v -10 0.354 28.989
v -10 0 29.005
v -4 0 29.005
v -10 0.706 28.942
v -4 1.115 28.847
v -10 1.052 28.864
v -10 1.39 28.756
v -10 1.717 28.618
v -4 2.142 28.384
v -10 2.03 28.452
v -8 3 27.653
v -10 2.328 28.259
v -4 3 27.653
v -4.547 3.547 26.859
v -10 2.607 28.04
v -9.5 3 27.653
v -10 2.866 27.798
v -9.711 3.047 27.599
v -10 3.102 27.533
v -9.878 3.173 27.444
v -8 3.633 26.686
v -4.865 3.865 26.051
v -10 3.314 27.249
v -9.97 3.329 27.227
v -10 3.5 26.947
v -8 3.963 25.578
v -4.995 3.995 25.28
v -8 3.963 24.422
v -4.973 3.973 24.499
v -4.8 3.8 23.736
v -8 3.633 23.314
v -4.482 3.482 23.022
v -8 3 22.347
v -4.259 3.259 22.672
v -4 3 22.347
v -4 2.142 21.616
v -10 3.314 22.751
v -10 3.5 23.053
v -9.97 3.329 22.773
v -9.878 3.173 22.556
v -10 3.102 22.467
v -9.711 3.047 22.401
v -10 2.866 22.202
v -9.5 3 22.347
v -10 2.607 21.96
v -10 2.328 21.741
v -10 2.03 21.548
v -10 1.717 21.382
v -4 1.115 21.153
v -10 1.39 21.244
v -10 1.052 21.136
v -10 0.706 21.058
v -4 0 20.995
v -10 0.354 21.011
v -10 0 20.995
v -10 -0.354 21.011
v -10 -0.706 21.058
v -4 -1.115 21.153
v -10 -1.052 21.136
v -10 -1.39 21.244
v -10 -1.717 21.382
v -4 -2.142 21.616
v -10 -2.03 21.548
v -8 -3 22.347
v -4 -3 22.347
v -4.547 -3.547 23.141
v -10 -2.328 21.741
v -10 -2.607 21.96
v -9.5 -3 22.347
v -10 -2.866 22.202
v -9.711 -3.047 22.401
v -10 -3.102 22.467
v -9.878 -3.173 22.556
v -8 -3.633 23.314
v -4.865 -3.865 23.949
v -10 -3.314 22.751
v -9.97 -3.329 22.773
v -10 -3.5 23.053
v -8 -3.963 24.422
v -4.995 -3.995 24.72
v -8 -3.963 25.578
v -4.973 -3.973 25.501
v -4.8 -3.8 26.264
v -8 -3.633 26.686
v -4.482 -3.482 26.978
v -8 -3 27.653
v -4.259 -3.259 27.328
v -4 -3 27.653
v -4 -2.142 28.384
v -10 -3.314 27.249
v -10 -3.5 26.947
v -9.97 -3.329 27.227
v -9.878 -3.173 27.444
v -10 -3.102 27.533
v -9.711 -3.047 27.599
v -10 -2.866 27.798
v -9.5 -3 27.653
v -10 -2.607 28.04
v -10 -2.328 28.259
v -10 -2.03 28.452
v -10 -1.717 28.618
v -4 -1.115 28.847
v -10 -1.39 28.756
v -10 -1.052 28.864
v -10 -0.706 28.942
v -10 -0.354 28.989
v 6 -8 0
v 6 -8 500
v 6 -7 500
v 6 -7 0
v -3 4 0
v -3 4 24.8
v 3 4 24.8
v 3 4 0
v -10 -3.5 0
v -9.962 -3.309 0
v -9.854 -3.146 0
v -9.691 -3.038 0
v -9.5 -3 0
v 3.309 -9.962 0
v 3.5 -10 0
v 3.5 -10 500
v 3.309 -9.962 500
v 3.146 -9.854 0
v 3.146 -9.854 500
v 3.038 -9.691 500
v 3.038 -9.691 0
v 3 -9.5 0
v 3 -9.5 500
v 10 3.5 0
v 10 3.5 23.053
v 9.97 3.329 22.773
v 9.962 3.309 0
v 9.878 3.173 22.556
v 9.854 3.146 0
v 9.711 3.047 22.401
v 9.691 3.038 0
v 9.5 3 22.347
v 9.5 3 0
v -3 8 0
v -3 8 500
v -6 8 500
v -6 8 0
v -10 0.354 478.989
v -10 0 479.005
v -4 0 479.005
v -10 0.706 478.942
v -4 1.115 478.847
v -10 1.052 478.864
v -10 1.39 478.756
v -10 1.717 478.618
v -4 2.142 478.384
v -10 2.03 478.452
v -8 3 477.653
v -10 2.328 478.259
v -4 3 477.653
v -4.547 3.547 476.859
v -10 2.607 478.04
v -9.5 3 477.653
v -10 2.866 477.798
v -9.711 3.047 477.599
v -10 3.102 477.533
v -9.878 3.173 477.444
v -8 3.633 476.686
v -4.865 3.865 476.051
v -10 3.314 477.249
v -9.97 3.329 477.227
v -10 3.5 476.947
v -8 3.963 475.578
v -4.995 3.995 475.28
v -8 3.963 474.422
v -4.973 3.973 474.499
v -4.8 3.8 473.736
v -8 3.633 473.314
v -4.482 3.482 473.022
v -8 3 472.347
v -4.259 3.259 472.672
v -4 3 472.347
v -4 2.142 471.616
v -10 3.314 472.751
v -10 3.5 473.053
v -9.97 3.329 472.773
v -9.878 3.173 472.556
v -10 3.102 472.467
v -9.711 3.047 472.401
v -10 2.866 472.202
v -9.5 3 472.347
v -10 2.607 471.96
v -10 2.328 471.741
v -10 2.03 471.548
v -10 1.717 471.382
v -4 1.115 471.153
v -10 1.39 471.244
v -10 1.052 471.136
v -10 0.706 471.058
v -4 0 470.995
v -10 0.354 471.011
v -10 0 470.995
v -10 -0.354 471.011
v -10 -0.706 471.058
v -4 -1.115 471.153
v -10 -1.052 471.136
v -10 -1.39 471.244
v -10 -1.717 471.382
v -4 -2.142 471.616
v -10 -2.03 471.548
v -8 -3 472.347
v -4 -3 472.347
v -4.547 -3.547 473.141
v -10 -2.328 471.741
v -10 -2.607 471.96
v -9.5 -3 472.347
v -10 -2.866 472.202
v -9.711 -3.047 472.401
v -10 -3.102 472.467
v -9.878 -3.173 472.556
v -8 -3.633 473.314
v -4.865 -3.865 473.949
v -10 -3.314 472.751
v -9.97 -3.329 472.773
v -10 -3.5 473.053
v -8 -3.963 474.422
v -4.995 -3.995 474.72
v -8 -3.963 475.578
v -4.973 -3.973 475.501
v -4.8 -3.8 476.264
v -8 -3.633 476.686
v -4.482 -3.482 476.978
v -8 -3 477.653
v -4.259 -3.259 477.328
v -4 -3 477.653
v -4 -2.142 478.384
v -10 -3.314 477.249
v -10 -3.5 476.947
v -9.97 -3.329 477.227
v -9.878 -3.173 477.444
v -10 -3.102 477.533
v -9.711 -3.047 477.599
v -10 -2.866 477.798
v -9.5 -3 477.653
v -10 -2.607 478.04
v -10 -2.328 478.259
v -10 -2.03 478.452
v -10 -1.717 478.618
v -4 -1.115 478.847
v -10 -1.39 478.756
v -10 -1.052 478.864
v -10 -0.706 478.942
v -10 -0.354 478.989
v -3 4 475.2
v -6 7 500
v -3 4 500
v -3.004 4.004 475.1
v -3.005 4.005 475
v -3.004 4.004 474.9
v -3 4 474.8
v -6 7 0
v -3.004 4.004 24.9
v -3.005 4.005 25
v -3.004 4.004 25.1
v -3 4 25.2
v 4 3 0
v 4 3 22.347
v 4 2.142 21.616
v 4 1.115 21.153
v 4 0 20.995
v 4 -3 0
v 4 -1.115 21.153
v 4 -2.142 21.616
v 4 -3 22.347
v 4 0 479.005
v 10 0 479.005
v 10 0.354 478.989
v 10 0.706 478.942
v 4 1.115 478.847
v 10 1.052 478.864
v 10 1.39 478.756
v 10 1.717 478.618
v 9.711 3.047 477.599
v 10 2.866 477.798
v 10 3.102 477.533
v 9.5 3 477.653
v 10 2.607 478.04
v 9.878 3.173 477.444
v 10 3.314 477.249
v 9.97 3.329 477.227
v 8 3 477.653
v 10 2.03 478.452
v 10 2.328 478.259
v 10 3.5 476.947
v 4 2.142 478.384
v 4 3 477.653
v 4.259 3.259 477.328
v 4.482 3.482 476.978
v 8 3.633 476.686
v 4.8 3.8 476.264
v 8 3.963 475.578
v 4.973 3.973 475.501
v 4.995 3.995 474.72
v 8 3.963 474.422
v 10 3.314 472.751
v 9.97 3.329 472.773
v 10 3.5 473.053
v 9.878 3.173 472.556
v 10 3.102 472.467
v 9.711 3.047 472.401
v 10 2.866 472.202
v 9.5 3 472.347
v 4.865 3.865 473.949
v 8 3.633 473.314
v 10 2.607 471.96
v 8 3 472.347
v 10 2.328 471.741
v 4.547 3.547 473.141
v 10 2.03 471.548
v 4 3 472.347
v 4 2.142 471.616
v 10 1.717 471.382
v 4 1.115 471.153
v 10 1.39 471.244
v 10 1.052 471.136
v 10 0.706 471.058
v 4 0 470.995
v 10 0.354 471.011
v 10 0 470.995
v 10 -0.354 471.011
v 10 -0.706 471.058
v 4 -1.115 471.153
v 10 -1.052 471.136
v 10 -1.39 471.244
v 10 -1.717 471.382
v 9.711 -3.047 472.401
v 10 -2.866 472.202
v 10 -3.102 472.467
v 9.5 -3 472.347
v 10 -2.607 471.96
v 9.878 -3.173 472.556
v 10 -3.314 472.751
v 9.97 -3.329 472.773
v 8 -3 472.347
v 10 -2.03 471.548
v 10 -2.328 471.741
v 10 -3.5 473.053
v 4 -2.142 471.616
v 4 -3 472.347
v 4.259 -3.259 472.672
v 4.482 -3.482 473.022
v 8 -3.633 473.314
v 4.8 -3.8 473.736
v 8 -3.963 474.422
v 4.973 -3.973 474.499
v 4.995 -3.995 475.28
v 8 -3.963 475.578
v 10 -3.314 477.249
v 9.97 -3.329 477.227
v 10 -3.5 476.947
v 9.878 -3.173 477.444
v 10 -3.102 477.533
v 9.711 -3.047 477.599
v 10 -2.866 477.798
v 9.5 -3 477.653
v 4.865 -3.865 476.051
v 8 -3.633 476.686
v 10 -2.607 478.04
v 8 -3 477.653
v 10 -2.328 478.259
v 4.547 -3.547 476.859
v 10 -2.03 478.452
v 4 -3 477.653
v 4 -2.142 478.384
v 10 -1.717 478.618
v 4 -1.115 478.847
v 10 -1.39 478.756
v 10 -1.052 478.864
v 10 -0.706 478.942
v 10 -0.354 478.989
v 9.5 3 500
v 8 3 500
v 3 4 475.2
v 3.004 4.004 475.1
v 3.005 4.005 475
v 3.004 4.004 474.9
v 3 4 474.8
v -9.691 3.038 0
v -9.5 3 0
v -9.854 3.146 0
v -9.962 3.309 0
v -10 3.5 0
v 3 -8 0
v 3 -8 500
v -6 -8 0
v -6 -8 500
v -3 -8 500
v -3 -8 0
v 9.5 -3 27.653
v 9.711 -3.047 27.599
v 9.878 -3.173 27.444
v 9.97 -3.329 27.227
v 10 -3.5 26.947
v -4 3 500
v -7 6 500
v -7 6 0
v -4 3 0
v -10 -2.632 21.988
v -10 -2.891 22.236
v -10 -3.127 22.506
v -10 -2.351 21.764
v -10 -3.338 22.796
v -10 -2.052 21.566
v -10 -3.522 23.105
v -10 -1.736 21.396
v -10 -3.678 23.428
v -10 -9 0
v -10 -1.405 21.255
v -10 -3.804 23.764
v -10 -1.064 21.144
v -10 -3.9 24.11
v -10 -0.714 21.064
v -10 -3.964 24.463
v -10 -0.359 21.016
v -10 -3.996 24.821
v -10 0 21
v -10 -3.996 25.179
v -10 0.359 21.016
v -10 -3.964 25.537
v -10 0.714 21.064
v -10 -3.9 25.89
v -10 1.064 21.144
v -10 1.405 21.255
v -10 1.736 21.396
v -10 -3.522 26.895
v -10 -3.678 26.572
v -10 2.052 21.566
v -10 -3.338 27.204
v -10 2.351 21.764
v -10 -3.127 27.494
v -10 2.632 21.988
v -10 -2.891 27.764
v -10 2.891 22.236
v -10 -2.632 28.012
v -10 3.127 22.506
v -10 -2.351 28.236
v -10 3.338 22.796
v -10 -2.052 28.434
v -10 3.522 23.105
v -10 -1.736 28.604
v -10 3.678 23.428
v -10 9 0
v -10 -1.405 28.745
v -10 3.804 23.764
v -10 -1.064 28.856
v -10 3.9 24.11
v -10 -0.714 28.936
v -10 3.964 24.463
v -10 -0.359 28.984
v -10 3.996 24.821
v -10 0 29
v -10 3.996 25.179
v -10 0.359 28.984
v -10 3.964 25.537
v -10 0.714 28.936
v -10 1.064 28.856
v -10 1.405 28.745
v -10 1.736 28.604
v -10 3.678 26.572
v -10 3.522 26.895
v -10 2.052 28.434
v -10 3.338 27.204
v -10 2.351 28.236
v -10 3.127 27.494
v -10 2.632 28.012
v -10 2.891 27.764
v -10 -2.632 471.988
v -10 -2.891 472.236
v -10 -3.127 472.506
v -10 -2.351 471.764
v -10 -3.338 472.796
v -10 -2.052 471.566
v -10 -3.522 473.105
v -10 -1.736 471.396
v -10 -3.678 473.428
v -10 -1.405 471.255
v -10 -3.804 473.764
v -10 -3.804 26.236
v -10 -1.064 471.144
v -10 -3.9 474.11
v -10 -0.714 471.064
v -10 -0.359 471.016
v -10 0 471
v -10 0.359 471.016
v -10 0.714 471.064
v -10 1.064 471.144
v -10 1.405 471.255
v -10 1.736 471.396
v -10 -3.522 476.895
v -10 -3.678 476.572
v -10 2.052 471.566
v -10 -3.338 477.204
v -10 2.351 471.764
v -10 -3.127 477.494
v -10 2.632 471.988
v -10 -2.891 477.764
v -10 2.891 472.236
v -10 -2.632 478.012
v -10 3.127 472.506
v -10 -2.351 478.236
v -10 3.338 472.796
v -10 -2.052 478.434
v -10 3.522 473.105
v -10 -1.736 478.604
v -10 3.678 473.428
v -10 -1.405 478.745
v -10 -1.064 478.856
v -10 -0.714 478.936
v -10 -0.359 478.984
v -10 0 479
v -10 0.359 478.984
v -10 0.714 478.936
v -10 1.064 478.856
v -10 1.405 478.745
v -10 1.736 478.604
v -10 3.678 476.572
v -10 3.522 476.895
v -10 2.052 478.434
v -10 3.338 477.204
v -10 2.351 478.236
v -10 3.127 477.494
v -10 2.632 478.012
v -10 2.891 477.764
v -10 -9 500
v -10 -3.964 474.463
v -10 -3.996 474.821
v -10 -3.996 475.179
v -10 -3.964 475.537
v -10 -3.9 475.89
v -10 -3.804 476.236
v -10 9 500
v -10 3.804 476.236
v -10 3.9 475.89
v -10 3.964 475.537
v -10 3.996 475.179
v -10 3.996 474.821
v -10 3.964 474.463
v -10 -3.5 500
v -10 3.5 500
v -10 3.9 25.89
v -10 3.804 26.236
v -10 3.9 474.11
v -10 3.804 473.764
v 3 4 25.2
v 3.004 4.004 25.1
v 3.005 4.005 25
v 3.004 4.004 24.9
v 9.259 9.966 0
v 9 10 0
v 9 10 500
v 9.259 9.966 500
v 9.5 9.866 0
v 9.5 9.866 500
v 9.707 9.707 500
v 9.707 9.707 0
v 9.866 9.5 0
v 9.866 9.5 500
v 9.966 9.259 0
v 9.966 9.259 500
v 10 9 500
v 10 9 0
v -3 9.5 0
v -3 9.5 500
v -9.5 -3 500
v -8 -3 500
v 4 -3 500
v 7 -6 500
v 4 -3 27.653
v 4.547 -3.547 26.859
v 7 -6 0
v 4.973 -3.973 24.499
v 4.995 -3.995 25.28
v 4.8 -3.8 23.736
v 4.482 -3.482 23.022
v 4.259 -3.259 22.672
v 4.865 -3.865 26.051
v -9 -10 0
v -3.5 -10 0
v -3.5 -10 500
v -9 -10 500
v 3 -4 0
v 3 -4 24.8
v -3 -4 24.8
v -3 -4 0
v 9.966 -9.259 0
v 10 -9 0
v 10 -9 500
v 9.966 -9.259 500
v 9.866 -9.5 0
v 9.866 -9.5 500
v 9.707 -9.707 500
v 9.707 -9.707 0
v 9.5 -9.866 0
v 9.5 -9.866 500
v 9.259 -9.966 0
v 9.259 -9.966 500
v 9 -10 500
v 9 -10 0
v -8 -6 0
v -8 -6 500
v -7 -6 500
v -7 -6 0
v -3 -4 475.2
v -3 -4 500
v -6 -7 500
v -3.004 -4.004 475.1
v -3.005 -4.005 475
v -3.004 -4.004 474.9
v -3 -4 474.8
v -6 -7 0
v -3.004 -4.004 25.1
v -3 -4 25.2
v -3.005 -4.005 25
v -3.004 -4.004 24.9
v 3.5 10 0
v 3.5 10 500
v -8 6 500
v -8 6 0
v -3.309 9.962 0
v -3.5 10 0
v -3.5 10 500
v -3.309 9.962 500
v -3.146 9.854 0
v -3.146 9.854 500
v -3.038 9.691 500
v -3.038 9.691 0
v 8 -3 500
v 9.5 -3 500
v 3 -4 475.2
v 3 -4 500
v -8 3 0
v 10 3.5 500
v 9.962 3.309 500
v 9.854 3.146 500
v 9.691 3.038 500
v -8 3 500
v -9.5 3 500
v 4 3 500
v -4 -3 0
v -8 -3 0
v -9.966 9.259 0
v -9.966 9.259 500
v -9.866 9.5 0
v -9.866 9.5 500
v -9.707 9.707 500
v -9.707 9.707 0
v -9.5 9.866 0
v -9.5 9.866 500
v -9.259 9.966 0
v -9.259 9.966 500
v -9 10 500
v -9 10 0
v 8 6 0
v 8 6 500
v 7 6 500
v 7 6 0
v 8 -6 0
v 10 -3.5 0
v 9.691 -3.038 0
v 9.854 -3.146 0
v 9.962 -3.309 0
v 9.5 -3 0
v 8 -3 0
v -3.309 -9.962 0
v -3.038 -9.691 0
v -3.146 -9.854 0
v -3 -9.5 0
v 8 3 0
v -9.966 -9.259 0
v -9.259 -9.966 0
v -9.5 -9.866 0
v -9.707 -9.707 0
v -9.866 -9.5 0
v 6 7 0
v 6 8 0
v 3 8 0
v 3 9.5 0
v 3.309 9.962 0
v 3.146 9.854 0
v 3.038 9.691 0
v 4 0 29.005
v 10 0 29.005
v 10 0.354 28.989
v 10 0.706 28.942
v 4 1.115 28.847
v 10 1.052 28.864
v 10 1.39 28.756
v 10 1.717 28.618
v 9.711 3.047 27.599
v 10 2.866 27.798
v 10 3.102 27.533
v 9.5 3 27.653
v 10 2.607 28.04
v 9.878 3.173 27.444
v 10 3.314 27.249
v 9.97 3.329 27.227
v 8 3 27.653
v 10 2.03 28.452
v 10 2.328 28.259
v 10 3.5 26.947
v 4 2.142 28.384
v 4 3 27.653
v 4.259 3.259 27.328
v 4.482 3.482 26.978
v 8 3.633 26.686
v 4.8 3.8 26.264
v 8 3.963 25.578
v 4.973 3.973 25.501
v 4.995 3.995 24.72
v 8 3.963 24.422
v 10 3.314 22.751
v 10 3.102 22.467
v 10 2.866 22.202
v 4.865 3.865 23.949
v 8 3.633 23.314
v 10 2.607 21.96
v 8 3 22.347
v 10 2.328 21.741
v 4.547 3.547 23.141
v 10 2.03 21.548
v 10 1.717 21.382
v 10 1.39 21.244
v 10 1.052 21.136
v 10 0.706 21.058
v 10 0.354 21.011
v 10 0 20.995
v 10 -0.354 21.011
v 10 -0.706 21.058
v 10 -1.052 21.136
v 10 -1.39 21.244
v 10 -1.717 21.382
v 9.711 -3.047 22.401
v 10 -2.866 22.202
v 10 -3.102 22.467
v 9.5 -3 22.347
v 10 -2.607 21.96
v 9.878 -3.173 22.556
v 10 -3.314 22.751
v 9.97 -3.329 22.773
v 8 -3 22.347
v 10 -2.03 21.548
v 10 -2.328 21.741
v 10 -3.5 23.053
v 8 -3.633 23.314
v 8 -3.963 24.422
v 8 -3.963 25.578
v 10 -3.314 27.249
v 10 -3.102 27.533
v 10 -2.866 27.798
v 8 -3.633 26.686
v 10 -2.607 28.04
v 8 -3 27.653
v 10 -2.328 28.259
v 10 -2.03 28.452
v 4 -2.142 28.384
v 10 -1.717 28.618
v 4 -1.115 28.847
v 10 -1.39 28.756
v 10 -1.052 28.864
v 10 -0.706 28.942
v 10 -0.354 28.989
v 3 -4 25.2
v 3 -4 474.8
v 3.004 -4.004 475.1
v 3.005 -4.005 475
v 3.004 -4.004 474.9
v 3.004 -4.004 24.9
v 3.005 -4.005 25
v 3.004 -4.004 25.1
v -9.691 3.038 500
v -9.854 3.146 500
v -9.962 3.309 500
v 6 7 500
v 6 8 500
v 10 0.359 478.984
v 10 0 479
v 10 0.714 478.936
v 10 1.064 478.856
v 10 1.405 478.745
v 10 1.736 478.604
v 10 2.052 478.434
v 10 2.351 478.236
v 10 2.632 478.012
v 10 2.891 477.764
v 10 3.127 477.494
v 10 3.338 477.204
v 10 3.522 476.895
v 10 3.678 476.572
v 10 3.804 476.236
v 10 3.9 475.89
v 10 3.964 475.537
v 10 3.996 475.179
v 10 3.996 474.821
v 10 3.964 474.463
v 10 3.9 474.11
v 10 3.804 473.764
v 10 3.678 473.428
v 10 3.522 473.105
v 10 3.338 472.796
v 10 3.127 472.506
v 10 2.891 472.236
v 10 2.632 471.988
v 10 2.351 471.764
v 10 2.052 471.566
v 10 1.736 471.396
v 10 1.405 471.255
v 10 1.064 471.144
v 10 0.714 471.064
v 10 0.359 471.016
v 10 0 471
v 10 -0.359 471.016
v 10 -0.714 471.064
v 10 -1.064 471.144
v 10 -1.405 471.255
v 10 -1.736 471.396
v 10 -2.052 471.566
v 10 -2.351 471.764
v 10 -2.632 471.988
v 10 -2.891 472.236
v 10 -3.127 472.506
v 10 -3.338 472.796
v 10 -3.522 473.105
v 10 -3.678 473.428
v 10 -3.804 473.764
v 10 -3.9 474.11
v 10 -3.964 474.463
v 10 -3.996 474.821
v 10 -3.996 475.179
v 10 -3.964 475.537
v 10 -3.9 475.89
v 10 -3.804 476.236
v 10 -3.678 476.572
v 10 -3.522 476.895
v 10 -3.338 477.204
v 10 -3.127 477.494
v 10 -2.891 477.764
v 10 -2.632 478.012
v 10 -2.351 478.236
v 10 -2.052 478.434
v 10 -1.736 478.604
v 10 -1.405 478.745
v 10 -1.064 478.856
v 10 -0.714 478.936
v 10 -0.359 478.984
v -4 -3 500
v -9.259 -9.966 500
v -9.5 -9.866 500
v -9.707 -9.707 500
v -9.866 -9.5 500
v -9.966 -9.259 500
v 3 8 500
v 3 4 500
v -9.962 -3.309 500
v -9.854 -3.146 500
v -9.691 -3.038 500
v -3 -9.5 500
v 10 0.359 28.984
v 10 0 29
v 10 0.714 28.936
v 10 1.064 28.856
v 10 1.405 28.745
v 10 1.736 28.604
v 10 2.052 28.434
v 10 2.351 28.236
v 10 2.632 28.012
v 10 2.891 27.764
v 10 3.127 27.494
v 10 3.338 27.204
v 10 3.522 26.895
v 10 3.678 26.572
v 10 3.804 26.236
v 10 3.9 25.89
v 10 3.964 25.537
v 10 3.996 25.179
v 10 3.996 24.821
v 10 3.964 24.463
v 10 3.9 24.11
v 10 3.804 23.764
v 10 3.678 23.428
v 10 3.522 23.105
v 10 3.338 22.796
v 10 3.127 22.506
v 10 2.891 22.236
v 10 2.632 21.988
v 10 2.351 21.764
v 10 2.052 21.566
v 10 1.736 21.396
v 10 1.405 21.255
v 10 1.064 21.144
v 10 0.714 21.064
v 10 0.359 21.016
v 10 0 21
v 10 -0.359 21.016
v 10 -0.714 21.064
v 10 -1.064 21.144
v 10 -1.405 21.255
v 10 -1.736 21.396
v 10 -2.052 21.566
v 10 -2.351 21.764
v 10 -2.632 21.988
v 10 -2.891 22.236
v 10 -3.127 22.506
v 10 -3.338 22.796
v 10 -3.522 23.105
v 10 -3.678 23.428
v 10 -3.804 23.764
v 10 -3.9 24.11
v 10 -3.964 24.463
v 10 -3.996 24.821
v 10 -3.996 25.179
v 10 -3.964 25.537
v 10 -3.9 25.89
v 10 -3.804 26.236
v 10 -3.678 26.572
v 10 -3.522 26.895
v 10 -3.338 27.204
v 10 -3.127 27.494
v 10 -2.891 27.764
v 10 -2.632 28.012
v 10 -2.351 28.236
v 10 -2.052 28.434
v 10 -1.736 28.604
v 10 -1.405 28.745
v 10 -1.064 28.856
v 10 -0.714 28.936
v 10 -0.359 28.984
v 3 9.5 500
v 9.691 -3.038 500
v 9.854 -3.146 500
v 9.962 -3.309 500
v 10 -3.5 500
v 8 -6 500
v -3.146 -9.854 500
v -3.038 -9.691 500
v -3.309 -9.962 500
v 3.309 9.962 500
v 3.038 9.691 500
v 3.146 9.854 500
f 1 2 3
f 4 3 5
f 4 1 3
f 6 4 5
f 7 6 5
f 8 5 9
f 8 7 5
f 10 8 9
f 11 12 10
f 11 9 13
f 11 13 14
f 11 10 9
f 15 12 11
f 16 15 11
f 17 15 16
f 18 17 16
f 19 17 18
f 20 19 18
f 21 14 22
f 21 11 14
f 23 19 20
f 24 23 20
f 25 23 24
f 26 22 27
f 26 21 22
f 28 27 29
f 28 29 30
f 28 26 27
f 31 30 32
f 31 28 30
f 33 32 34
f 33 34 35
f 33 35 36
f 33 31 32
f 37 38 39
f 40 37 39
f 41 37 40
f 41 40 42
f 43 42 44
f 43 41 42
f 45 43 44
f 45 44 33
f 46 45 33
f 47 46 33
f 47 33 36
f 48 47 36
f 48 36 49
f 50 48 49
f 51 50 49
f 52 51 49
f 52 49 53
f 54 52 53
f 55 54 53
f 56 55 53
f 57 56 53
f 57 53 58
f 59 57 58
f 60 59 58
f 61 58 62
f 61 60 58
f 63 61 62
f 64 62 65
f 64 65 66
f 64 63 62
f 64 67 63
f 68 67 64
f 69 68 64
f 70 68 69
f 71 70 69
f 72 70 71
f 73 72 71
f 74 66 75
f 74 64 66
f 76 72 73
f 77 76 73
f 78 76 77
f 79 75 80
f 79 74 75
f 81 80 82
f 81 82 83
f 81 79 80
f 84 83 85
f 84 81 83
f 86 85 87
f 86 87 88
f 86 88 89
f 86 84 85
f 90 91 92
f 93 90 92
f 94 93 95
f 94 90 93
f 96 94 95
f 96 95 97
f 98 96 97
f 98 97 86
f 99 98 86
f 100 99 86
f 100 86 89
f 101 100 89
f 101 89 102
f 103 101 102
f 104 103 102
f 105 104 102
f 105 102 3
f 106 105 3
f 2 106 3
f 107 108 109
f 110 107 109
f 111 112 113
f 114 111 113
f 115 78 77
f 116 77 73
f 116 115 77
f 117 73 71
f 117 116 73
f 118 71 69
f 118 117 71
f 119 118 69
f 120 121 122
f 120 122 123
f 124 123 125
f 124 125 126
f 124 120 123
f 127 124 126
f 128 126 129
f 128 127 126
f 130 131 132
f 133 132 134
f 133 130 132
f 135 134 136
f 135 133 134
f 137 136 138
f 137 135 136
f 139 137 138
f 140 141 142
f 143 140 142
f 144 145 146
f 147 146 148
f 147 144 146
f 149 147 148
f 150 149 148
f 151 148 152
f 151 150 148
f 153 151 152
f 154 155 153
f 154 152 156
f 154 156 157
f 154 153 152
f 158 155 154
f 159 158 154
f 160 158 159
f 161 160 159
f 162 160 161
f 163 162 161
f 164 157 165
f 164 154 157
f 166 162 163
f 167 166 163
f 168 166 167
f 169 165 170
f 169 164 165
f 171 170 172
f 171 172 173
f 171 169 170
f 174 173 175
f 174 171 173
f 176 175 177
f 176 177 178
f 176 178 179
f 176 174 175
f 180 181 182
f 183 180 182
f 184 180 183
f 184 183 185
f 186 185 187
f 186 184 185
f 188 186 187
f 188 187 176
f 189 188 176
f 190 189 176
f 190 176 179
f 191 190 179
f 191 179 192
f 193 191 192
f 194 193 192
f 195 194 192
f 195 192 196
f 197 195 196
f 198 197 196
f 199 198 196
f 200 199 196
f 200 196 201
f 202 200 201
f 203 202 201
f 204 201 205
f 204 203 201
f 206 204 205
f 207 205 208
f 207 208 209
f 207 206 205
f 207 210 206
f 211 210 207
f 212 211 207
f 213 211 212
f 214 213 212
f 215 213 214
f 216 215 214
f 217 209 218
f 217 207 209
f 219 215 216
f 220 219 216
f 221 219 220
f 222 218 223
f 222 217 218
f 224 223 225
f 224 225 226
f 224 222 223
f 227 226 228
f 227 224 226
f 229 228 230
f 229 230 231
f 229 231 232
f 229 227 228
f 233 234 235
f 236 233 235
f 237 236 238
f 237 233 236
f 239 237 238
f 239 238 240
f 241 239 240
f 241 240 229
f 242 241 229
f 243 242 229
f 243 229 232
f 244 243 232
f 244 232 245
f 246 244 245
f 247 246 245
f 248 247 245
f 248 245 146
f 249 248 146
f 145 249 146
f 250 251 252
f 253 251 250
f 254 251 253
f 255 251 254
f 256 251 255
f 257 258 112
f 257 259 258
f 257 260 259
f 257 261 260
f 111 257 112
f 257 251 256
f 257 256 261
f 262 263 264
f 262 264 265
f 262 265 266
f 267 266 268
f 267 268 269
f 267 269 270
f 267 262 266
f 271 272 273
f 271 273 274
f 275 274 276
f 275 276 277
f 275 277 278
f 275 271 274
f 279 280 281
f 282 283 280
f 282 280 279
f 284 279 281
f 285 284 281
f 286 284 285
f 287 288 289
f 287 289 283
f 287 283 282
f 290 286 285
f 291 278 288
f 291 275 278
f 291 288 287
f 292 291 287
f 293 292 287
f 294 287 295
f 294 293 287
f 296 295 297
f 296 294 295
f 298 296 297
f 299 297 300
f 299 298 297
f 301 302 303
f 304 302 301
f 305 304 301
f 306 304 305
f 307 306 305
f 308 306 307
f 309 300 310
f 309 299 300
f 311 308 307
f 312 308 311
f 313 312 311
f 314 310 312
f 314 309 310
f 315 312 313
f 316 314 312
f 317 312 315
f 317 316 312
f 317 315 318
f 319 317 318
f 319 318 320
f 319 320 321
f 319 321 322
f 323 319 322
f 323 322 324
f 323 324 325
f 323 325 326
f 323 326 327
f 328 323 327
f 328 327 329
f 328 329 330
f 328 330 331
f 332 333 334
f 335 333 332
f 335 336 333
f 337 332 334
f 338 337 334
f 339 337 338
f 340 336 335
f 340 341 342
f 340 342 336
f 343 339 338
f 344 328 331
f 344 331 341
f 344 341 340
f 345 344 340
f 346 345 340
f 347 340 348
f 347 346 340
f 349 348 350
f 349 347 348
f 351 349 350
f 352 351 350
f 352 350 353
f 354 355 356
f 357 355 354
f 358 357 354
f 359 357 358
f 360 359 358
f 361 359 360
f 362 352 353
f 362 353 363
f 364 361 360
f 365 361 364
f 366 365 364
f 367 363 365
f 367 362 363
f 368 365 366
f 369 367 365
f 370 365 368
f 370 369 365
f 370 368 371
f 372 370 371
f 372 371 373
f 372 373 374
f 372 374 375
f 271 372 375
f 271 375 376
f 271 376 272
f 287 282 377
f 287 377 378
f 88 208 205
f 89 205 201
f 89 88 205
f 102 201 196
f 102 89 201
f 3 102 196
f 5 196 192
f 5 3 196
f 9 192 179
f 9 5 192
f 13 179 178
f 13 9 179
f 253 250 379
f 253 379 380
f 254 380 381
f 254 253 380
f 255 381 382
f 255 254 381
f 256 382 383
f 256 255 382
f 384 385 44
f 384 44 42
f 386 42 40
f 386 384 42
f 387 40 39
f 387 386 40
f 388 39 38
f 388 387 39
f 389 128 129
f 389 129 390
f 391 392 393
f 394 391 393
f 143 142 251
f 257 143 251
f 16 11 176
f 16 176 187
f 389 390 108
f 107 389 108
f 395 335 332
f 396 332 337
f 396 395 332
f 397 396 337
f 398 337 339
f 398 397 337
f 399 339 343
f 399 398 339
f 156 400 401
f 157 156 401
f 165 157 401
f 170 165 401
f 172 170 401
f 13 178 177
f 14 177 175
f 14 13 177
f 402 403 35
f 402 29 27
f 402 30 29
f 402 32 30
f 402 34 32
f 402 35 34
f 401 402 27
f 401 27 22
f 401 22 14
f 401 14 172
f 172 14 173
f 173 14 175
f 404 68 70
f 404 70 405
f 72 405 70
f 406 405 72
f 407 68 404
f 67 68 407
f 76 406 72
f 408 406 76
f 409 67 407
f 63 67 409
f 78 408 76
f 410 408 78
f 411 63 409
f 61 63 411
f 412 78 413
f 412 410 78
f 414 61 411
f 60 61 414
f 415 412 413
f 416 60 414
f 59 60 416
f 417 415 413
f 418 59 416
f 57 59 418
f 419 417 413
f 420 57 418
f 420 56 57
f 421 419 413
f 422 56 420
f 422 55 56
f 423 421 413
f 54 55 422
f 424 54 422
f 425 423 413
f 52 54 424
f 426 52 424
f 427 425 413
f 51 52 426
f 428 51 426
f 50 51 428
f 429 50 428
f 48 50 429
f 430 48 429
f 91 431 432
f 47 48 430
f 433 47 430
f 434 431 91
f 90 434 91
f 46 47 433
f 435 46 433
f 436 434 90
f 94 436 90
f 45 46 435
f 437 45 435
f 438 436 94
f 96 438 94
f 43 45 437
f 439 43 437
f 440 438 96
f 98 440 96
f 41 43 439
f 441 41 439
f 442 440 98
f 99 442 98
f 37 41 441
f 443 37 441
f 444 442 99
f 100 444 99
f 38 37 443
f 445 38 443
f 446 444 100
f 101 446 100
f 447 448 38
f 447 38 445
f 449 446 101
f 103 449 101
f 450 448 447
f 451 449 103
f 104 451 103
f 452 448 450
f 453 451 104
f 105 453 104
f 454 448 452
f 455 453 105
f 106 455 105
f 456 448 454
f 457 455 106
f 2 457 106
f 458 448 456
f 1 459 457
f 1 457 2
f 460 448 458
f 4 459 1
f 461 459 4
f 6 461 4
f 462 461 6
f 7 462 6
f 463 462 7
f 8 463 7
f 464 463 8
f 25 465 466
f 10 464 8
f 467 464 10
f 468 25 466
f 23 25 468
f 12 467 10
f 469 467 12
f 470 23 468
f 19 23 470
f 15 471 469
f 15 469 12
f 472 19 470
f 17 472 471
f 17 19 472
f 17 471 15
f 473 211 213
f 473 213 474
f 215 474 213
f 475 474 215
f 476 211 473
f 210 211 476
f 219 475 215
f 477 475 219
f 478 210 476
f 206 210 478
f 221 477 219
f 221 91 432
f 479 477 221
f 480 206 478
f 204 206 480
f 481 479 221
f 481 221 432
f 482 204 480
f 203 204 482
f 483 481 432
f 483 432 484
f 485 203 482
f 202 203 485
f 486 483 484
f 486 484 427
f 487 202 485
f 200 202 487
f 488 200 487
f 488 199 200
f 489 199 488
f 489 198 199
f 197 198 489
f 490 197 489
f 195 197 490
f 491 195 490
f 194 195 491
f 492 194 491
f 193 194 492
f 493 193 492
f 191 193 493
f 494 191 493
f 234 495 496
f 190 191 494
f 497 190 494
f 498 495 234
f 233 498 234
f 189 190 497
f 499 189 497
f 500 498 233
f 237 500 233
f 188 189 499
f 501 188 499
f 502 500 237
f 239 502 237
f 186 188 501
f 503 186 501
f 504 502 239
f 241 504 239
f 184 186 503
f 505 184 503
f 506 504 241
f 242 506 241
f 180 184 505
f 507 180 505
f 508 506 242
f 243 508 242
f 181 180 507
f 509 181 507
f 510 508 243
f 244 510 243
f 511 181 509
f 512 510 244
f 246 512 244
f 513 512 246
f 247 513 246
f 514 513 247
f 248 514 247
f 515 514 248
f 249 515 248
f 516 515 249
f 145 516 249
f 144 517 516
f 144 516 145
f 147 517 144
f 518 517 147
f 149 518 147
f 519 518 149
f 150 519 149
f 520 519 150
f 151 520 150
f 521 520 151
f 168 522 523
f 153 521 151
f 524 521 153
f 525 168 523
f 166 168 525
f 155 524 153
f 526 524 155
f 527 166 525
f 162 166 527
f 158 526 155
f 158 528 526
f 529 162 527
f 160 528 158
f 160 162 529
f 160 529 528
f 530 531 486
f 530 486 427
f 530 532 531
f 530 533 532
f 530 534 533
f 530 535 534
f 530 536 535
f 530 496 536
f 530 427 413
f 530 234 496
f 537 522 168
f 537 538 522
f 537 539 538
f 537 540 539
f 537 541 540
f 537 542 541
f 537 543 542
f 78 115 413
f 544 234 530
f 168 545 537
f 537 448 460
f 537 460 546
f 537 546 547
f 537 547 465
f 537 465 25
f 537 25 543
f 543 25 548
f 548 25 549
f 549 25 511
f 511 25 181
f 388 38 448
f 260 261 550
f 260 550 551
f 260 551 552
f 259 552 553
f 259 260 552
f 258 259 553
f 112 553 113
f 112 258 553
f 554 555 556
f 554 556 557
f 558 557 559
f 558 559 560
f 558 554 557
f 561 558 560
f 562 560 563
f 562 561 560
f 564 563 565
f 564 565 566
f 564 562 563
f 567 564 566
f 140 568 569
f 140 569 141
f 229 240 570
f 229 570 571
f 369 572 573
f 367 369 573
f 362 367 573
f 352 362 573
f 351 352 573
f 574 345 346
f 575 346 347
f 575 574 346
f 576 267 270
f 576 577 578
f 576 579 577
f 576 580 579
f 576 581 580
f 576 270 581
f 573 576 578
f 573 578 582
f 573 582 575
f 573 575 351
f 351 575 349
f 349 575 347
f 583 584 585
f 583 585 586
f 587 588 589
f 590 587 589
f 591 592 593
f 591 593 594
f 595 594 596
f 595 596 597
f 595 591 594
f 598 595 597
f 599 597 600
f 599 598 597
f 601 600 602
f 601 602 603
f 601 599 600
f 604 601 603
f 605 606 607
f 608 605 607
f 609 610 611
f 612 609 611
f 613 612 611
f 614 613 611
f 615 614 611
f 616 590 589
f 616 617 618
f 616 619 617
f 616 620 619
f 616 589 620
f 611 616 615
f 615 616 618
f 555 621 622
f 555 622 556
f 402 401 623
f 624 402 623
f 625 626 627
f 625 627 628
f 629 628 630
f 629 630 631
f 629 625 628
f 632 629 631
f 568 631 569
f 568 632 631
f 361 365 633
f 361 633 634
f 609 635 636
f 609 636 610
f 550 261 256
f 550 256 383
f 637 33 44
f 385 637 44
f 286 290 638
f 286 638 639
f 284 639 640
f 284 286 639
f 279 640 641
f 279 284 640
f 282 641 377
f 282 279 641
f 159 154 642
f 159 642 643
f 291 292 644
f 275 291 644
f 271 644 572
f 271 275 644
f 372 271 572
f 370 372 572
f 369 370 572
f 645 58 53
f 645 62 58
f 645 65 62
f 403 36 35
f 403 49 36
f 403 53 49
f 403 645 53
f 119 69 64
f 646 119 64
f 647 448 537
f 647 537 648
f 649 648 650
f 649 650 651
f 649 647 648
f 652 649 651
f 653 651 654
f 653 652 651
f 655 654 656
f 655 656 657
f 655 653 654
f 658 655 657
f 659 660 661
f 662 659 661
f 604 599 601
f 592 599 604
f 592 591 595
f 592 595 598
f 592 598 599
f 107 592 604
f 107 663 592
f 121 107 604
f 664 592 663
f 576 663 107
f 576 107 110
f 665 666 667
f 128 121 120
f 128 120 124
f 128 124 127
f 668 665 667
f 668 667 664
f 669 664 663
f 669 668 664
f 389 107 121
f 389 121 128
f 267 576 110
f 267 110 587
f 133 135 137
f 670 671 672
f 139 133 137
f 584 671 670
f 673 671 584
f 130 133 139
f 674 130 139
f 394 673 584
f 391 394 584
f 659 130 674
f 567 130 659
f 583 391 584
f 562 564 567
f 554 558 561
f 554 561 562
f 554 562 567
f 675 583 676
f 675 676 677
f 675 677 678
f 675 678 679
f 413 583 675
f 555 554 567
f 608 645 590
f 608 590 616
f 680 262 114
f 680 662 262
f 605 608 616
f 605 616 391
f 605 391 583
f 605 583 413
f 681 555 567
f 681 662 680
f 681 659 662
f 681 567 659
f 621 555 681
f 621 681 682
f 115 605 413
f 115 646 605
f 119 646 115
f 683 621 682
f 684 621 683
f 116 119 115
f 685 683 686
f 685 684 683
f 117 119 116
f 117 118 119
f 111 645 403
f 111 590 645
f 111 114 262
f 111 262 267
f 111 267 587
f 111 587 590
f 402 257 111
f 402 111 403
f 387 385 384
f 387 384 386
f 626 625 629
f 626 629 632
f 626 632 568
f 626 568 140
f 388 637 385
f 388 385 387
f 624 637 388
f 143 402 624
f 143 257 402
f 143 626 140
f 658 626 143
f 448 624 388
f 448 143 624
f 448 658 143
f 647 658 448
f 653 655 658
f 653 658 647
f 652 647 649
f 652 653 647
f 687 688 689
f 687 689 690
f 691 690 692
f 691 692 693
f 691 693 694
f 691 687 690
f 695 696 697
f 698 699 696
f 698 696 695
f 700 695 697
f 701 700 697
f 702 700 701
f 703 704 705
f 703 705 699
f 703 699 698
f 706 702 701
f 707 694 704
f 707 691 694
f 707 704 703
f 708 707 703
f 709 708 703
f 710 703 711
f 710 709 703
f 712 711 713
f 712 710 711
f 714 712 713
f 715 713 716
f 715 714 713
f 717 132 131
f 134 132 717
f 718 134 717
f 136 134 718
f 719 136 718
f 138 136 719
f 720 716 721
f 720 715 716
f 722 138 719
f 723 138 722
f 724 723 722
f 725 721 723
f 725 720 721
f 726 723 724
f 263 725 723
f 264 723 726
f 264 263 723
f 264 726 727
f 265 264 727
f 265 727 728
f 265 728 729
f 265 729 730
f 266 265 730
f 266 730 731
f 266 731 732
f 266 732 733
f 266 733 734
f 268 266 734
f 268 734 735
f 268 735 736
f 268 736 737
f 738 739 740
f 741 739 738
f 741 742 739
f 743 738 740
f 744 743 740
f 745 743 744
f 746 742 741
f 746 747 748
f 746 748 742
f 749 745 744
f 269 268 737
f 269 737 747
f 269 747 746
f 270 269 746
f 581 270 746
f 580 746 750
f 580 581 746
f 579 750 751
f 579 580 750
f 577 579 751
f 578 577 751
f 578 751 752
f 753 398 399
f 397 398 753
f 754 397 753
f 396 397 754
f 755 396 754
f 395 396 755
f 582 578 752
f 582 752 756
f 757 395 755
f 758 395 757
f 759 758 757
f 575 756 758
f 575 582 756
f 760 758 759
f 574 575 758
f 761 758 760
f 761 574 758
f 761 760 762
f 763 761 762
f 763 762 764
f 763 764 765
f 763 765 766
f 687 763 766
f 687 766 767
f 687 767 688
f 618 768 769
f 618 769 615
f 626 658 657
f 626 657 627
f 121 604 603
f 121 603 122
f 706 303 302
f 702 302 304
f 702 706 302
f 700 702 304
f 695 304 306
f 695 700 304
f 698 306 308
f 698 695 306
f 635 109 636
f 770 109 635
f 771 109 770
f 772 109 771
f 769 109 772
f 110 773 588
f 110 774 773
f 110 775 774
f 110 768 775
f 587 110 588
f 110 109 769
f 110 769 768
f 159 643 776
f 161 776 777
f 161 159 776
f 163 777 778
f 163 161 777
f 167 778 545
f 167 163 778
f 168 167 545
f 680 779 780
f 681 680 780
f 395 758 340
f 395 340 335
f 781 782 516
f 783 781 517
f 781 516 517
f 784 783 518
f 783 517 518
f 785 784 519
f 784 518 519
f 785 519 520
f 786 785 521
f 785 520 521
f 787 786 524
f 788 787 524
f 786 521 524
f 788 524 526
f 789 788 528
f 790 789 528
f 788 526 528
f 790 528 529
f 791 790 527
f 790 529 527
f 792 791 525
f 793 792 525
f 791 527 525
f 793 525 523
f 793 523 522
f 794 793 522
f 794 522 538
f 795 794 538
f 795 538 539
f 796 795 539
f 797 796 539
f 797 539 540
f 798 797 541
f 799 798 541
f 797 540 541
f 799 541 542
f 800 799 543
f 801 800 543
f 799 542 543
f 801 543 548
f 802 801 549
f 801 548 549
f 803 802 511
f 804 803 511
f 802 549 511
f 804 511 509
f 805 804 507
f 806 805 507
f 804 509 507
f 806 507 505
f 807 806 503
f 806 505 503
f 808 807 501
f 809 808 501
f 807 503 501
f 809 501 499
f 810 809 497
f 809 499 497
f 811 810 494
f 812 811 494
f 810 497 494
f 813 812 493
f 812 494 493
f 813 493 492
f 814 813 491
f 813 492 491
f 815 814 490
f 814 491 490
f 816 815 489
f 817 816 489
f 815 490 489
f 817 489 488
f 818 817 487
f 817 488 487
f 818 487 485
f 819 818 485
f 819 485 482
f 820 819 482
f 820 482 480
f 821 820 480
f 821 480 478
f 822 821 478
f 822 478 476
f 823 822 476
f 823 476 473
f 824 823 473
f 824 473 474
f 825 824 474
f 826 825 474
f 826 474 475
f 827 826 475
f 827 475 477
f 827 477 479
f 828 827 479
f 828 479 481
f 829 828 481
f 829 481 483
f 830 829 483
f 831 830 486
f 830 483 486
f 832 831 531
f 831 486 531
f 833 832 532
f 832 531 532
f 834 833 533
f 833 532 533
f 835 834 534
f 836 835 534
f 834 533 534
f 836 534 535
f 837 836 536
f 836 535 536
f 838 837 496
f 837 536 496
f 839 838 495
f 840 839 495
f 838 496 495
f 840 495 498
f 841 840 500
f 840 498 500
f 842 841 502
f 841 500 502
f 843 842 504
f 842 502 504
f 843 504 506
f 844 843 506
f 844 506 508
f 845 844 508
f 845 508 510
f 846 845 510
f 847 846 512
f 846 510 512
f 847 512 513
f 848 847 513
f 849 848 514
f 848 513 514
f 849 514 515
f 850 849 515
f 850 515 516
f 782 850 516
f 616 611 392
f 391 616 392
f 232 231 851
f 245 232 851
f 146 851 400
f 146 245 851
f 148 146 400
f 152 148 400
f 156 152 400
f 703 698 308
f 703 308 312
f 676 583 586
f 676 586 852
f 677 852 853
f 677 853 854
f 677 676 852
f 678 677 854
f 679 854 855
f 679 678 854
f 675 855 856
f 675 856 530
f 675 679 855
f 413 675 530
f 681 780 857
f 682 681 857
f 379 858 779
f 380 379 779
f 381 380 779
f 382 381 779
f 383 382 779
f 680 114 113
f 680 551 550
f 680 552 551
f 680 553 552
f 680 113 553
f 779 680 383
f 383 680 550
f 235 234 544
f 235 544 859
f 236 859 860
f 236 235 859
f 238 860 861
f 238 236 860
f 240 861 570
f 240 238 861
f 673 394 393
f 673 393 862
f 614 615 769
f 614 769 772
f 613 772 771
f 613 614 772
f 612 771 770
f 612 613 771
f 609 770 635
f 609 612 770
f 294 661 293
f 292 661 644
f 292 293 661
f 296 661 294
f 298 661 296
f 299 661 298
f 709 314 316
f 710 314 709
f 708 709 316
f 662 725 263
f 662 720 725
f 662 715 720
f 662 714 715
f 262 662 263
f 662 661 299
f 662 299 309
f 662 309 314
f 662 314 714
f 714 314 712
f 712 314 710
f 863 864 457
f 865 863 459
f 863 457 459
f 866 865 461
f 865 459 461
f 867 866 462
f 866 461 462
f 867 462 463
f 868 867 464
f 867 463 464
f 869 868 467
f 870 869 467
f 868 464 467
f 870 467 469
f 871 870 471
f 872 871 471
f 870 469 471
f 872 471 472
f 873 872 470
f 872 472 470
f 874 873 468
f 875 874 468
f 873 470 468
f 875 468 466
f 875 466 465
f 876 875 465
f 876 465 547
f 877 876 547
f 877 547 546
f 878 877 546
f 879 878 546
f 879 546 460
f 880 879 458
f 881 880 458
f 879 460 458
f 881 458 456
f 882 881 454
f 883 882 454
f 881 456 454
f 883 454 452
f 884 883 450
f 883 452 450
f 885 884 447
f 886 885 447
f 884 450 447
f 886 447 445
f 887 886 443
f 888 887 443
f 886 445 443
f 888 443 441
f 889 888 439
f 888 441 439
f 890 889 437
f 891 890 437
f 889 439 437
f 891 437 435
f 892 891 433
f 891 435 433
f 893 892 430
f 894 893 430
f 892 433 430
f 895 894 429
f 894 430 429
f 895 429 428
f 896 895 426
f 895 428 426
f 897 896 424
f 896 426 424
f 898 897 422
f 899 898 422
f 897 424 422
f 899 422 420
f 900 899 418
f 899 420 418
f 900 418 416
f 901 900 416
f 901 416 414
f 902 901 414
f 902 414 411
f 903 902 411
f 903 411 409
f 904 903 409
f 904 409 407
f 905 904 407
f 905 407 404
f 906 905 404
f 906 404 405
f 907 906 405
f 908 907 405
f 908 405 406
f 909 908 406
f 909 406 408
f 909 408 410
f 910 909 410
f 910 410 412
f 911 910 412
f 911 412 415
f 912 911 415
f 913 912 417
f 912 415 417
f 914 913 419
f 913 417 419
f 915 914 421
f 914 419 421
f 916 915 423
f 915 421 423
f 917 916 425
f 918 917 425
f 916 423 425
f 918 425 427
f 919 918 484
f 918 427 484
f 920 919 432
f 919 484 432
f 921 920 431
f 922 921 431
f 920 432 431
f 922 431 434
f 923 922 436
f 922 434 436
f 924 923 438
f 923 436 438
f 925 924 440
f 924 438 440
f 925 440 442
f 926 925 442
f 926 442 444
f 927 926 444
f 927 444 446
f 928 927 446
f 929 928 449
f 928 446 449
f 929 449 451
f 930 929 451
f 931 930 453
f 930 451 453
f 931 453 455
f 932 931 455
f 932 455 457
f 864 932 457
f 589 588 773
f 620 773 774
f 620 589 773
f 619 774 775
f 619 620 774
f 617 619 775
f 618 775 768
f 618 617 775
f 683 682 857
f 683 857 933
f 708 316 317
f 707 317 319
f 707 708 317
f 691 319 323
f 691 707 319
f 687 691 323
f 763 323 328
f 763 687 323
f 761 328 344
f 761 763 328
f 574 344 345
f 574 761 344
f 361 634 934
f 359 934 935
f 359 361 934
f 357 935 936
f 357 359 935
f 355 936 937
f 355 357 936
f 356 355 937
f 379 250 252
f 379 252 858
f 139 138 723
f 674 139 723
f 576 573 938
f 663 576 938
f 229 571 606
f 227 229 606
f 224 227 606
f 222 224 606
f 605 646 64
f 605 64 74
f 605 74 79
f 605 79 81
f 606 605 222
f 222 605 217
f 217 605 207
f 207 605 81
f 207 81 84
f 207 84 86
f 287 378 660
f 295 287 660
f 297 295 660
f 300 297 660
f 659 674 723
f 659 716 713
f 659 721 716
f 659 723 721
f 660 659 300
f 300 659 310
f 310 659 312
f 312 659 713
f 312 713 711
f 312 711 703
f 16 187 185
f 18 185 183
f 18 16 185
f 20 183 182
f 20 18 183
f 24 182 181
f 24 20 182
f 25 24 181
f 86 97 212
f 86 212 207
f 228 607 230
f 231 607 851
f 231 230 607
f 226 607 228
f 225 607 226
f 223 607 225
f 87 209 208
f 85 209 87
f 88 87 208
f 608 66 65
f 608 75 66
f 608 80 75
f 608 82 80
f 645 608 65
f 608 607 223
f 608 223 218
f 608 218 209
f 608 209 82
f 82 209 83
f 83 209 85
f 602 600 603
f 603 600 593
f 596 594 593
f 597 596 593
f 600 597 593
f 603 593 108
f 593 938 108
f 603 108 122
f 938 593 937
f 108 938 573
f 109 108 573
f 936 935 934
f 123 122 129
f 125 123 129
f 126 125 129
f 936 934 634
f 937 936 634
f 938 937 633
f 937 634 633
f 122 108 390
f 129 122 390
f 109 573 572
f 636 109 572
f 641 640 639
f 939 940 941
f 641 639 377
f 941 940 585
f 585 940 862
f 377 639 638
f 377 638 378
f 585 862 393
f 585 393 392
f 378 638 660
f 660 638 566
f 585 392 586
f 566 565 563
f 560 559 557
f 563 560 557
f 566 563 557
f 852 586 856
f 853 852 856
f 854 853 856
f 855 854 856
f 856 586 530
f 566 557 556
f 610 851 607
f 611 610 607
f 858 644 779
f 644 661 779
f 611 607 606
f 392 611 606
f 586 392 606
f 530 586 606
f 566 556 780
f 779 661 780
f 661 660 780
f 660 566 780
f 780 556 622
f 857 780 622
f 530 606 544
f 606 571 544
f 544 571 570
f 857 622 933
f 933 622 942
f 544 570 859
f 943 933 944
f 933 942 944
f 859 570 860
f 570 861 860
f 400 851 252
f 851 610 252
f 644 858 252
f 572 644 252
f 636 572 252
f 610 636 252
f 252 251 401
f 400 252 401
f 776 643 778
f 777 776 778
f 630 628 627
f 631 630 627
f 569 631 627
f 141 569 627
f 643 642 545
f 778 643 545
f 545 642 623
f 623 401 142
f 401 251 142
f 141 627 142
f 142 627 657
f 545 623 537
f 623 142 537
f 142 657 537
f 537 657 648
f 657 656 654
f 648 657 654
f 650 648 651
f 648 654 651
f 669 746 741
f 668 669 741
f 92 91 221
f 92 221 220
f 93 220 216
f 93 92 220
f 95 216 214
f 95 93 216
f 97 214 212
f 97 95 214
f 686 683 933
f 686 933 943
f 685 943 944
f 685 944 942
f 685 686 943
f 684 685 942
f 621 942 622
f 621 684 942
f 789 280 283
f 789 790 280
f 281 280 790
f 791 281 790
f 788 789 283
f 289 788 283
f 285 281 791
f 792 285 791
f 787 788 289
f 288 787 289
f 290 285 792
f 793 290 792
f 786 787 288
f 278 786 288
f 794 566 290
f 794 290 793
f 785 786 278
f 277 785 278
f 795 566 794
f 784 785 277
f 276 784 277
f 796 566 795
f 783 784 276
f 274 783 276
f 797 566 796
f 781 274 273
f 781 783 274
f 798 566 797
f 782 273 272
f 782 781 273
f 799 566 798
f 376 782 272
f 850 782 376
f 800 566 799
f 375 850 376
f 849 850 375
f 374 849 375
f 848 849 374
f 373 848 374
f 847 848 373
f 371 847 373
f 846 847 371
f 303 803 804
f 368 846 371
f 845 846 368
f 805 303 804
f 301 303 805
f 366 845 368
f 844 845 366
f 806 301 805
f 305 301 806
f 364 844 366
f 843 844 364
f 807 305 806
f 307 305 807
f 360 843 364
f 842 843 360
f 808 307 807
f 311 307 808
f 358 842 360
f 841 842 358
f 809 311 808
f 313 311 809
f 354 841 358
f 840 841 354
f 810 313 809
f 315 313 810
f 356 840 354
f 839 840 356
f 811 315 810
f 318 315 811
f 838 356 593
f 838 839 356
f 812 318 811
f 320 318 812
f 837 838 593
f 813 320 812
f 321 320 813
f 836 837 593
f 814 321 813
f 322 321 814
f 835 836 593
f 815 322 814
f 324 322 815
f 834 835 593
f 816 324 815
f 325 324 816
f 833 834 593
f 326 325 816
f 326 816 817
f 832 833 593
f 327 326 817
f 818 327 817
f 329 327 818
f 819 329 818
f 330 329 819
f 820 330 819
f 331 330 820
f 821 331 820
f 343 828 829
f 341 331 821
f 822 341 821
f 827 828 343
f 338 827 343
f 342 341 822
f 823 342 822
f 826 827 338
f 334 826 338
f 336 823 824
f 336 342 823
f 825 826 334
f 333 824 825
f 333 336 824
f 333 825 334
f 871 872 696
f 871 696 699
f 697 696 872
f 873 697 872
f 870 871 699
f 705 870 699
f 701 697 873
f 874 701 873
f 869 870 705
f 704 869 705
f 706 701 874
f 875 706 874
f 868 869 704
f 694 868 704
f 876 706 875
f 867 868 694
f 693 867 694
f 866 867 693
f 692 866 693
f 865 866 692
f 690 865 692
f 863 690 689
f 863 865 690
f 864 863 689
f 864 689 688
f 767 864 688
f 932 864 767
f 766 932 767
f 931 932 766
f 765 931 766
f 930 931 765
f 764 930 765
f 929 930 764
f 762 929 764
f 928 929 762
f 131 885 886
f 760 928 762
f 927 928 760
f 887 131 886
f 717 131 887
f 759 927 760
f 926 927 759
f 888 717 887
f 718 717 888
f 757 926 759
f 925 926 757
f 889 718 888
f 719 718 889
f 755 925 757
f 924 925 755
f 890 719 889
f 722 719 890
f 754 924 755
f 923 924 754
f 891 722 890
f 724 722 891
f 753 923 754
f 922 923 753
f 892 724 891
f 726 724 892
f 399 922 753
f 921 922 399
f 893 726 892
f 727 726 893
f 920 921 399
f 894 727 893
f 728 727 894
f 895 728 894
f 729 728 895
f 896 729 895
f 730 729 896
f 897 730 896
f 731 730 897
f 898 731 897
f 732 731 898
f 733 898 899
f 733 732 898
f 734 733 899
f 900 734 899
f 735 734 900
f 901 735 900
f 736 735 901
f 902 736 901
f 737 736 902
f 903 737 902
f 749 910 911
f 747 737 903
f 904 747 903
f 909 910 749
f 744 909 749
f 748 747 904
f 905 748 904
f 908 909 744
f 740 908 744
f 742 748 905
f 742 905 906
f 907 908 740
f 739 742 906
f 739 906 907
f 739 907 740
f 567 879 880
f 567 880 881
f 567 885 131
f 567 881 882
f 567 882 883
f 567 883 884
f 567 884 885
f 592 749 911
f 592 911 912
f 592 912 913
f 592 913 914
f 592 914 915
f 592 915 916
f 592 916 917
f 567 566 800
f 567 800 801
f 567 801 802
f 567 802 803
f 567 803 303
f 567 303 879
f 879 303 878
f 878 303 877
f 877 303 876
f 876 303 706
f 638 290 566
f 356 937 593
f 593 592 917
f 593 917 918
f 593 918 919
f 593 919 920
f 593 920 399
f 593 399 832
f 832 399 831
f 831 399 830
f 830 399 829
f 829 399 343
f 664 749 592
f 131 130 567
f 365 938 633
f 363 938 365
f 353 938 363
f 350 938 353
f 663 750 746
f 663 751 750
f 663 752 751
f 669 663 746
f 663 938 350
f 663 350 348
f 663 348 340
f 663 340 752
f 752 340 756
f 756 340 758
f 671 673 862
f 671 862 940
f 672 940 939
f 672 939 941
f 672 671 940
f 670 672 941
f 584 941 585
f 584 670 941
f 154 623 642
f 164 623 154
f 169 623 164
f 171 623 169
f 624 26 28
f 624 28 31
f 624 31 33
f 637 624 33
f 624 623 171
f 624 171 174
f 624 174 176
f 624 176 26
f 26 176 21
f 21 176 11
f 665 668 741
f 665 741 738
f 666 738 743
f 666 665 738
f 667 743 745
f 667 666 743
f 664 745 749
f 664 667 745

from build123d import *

# Parameters (mm, degrees)
ESTRUSIONE_ESTRUSIONE1_DEPTH = 500
SCHIZZO2_R                   = 4.005
ESTRUSIONE_ESTRUSIONE4_DEPTH = 20
SCHIZZO6_R                   = 4
TAGLIO_ESTRUSIONE20_DEPTH    = 20


with BuildPart() as part:
    # Schizzo1 → Estrusione-Estrusione1 (new body)
    with BuildSketch(Plane.XY):
        with BuildLine():
            Line((-4, -3), (-4, 3))
            Line((-4, 3), (-7, 6))
            Line((-7, 6), (-8, 6))
            Line((-8, 6), (-8, 3))
            Line((-8, 3), (-9.5, 3))
            ThreePointArc((-9.5, 3), (-9.853553391, 3.146446609), (-10, 3.5))
            Line((-10, 3.5), (-10, 9))
            ThreePointArc((-10, 9), (-9.707106781, 9.707106781), (-9, 10))
            Line((-9, 10), (-3.5, 10))
            ThreePointArc((-3.5, 10), (-3.146446609, 9.853553391), (-3, 9.5))
            Line((-3, 9.5), (-3, 8))
            Line((-3, 8), (-6, 8))
            Line((-6, 8), (-6, 7))
            Line((-6, 7), (-3, 4))
            Line((-3, 4), (3, 4))
            Line((3, 4), (6, 7))
            Line((6, 7), (6, 8))
            Line((6, 8), (3, 8))
            Line((3, 8), (3, 9.5))
            ThreePointArc((3, 9.5), (3.146446609, 9.853553391), (3.5, 10))
            Line((3.5, 10), (9, 10))
            ThreePointArc((9, 10), (9.707106781, 9.707106781), (10, 9))
            Line((10, 9), (10, 3.5))
            ThreePointArc((10, 3.5), (9.853553391, 3.146446609), (9.5, 3))
            Line((9.5, 3), (8, 3))
            Line((8, 3), (8, 6))
            Line((8, 6), (7, 6))
            Line((7, 6), (4, 3))
            Line((4, 3), (4, -3))
            Line((4, -3), (7, -6))
            Line((7, -6), (8, -6))
            Line((8, -6), (8, -3))
            Line((8, -3), (9.5, -3))
            ThreePointArc((9.5, -3), (9.853553391, -3.146446609), (10, -3.5))
            Line((10, -3.5), (10, -9))
            ThreePointArc((10, -9), (9.707106781, -9.707106781), (9, -10))
            Line((9, -10), (3.5, -10))
            ThreePointArc((3.5, -10), (3.146446609, -9.853553391), (3, -9.5))
            Line((3, -9.5), (3, -8))
            Line((3, -8), (6, -8))
            Line((6, -8), (6, -7))
            Line((6, -7), (3, -4))
            Line((3, -4), (-3, -4))
            Line((-3, -4), (-6, -7))
            Line((-6, -7), (-6, -8))
            Line((-6, -8), (-3, -8))
            Line((-3, -8), (-3, -9.5))
            ThreePointArc((-3, -9.5), (-3.146446609, -9.853553391), (-3.5, -10))
            Line((-3.5, -10), (-9, -10))
            ThreePointArc((-9, -10), (-9.707106781, -9.707106781), (-10, -9))
            Line((-10, -9), (-10, -3.5))
            ThreePointArc((-10, -3.5), (-9.853553391, -3.146446609), (-9.5, -3))
            Line((-9.5, -3), (-8, -3))
            Line((-8, -3), (-8, -6))
            Line((-8, -6), (-7, -6))
            Line((-7, -6), (-4, -3))
        make_face()
    extrude(amount=ESTRUSIONE_ESTRUSIONE1_DEPTH)

    # Schizzo2 → Estrusione-Estrusione4 (add)
    with BuildSketch(Plane.ZY.offset(10)):
        with Locations((25, 0)):
            Circle(SCHIZZO2_R)
        with Locations((475, 0)):
            Circle(SCHIZZO2_R)
    extrude(amount=-ESTRUSIONE_ESTRUSIONE4_DEPTH)

    # Schizzo6 → Taglio-Estrusione20 (cut)
    with BuildSketch(Plane.ZY.offset(10)):
        with Locations((25, 0)):
            Circle(SCHIZZO6_R)
        with Locations((475, 0)):
            Circle(SCHIZZO6_R)
    extrude(amount=-TAGLIO_ESTRUSIONE20_DEPTH, mode=Mode.SUBTRACT)


solid = part.part
